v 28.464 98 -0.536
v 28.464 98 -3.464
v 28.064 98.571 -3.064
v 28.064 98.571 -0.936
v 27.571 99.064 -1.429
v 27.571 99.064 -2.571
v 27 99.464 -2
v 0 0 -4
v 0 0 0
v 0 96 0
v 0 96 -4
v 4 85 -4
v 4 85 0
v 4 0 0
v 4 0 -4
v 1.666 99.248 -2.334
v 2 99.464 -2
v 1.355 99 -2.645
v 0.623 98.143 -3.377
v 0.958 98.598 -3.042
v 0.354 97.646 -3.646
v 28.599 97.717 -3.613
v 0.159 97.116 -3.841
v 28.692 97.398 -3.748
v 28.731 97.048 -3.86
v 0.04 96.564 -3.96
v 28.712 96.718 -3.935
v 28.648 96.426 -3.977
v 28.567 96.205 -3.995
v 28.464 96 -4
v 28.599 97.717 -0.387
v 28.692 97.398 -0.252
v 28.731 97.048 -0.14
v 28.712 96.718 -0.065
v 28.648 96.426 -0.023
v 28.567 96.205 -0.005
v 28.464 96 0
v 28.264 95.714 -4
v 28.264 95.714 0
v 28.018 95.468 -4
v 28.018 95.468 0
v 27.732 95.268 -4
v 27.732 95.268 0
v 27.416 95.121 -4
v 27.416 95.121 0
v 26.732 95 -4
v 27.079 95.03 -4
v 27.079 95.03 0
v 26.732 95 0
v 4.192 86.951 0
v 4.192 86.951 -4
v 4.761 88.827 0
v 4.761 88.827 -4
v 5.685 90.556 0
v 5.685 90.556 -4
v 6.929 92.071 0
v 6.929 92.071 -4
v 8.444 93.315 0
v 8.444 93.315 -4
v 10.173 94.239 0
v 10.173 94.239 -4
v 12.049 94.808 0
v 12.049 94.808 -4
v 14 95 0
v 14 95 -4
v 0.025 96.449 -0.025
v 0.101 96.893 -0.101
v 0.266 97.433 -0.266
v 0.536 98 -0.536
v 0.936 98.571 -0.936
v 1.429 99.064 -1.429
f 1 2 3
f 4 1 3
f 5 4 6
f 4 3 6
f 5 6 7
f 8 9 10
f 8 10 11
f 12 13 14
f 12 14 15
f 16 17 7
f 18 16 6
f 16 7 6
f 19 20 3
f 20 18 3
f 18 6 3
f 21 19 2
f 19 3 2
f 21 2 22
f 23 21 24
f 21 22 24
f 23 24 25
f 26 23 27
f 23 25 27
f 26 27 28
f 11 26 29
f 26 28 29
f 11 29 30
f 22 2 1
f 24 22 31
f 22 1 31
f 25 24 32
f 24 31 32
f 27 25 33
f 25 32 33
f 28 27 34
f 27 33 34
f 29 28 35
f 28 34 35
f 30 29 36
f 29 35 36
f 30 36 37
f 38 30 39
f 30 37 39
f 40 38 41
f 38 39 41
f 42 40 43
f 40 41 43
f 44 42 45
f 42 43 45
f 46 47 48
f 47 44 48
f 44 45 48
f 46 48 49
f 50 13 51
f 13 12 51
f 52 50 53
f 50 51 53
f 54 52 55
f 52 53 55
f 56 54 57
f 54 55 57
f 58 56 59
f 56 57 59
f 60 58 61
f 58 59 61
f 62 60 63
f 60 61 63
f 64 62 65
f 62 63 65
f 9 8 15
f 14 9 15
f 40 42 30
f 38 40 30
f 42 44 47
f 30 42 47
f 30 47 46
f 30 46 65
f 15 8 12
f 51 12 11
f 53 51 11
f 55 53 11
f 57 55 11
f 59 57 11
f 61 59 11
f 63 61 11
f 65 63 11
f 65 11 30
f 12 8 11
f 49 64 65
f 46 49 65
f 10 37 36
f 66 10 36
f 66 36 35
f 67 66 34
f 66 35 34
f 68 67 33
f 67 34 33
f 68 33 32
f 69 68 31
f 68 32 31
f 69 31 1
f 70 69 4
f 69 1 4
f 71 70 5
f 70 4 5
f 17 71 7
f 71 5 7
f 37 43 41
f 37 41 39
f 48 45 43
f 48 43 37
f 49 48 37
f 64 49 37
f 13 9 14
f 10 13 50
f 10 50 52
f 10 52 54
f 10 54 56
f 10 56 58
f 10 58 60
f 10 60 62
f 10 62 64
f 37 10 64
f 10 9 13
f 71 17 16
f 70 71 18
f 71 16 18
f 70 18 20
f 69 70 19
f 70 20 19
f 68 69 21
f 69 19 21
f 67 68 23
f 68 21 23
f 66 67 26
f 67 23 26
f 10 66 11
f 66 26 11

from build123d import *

# Parameters (mm, degrees)
SKETCH1_W           = 4
SKETCH1_H           = 4
BOSS_EXTRUDE1_DEPTH = 100
SKETCH2_W           = 4
SKETCH2_H           = 5
BOSS_EXTRUDE2_DEPTH = 25
FILLET1_R           = 10
FILLET3_R           = 4
FILLET4_R           = 2


with BuildPart() as part:
    # Sketch1 → Boss-Extrude1 (new body)
    with BuildSketch(Plane(origin=(0, 0, 0), x_dir=(1, 0, 0), z_dir=(0, 1, 0))):
        with Locations((2, 2)):
            Rectangle(SKETCH1_W, SKETCH1_H)
    extrude(amount=BOSS_EXTRUDE1_DEPTH)

    # Sketch2 → Boss-Extrude2 (add)
    with BuildSketch(Plane(origin=(4, 0, 0), x_dir=(0, 0, -1), z_dir=(1, 0, 0))):
        with Locations((2, 97.5)):
            Rectangle(SKETCH2_W, SKETCH2_H)
    extrude(amount=BOSS_EXTRUDE2_DEPTH)

    # Fillet1
    fillet1_edges = [part.edges().sort_by_distance(p)[0] for p in [
        (4, 95, -2),
    ]]
    fillet(fillet1_edges, radius=FILLET1_R)

    # Fillet3
    # the kernel refuses this fillet: 4 mm, written as the material it takes off along each edge
    with BuildSketch(Plane(origin=(39, 100, -4), x_dir=(0, 0, 1), z_dir=(-1, 0, 0)), Plane(origin=(39, 100, 0), x_dir=(0, -1, 0), z_dir=(-1, 0, 0))) as fillet3_piece_1:
        with BuildLine():
            CenterArc((FILLET3_R, -FILLET3_R), FILLET3_R, 90, 90)
            Line((0, -FILLET3_R), (0, 0))
            Line((0, 0), (FILLET3_R, 0))
        make_face()
    extrude(amount=49, mode=Mode.SUBTRACT)
    with BuildSketch(Plane(origin=(29, 100, -14), x_dir=(0, -1, 0), z_dir=(0, 0, 1)), Plane(origin=(0, 100, -14), x_dir=(1, 0, 0), z_dir=(0, 0, 1))) as fillet3_piece_2:
        with BuildLine():
            CenterArc((FILLET3_R, -FILLET3_R), FILLET3_R, 90, 90)
            Line((0, -FILLET3_R), (0, 0))
            Line((0, 0), (FILLET3_R, 0))
        make_face()
    extrude(amount=24, mode=Mode.SUBTRACT)

    # Fillet4
    # the kernel refuses this fillet: 2 mm, written as the material it takes off along each edge
    with BuildSketch(Plane(origin=(29, 95, 7.618721628), x_dir=(-1, 0, 0), z_dir=(0, 0, -1))) as fillet4_piece_1:
        with BuildLine():
            CenterArc((2.267949192, 2), FILLET4_R, 150, 120)
            Line((0.535898385, 3), (0.362693304, 3.1))
            ThreePointArc((0.362693304, 3.1), (-0.2, 1), (-0.2, 0))
            Line((-0.2, 0), (0, -0.2))
            Line((0, -0.2), (2.267949192, -0.2))
            Line((2.267949192, -0.2), (2.267949192, 0))
        make_face()
    extrude(amount=19.237443256, mode=Mode.SUBTRACT)


solid = part.part
